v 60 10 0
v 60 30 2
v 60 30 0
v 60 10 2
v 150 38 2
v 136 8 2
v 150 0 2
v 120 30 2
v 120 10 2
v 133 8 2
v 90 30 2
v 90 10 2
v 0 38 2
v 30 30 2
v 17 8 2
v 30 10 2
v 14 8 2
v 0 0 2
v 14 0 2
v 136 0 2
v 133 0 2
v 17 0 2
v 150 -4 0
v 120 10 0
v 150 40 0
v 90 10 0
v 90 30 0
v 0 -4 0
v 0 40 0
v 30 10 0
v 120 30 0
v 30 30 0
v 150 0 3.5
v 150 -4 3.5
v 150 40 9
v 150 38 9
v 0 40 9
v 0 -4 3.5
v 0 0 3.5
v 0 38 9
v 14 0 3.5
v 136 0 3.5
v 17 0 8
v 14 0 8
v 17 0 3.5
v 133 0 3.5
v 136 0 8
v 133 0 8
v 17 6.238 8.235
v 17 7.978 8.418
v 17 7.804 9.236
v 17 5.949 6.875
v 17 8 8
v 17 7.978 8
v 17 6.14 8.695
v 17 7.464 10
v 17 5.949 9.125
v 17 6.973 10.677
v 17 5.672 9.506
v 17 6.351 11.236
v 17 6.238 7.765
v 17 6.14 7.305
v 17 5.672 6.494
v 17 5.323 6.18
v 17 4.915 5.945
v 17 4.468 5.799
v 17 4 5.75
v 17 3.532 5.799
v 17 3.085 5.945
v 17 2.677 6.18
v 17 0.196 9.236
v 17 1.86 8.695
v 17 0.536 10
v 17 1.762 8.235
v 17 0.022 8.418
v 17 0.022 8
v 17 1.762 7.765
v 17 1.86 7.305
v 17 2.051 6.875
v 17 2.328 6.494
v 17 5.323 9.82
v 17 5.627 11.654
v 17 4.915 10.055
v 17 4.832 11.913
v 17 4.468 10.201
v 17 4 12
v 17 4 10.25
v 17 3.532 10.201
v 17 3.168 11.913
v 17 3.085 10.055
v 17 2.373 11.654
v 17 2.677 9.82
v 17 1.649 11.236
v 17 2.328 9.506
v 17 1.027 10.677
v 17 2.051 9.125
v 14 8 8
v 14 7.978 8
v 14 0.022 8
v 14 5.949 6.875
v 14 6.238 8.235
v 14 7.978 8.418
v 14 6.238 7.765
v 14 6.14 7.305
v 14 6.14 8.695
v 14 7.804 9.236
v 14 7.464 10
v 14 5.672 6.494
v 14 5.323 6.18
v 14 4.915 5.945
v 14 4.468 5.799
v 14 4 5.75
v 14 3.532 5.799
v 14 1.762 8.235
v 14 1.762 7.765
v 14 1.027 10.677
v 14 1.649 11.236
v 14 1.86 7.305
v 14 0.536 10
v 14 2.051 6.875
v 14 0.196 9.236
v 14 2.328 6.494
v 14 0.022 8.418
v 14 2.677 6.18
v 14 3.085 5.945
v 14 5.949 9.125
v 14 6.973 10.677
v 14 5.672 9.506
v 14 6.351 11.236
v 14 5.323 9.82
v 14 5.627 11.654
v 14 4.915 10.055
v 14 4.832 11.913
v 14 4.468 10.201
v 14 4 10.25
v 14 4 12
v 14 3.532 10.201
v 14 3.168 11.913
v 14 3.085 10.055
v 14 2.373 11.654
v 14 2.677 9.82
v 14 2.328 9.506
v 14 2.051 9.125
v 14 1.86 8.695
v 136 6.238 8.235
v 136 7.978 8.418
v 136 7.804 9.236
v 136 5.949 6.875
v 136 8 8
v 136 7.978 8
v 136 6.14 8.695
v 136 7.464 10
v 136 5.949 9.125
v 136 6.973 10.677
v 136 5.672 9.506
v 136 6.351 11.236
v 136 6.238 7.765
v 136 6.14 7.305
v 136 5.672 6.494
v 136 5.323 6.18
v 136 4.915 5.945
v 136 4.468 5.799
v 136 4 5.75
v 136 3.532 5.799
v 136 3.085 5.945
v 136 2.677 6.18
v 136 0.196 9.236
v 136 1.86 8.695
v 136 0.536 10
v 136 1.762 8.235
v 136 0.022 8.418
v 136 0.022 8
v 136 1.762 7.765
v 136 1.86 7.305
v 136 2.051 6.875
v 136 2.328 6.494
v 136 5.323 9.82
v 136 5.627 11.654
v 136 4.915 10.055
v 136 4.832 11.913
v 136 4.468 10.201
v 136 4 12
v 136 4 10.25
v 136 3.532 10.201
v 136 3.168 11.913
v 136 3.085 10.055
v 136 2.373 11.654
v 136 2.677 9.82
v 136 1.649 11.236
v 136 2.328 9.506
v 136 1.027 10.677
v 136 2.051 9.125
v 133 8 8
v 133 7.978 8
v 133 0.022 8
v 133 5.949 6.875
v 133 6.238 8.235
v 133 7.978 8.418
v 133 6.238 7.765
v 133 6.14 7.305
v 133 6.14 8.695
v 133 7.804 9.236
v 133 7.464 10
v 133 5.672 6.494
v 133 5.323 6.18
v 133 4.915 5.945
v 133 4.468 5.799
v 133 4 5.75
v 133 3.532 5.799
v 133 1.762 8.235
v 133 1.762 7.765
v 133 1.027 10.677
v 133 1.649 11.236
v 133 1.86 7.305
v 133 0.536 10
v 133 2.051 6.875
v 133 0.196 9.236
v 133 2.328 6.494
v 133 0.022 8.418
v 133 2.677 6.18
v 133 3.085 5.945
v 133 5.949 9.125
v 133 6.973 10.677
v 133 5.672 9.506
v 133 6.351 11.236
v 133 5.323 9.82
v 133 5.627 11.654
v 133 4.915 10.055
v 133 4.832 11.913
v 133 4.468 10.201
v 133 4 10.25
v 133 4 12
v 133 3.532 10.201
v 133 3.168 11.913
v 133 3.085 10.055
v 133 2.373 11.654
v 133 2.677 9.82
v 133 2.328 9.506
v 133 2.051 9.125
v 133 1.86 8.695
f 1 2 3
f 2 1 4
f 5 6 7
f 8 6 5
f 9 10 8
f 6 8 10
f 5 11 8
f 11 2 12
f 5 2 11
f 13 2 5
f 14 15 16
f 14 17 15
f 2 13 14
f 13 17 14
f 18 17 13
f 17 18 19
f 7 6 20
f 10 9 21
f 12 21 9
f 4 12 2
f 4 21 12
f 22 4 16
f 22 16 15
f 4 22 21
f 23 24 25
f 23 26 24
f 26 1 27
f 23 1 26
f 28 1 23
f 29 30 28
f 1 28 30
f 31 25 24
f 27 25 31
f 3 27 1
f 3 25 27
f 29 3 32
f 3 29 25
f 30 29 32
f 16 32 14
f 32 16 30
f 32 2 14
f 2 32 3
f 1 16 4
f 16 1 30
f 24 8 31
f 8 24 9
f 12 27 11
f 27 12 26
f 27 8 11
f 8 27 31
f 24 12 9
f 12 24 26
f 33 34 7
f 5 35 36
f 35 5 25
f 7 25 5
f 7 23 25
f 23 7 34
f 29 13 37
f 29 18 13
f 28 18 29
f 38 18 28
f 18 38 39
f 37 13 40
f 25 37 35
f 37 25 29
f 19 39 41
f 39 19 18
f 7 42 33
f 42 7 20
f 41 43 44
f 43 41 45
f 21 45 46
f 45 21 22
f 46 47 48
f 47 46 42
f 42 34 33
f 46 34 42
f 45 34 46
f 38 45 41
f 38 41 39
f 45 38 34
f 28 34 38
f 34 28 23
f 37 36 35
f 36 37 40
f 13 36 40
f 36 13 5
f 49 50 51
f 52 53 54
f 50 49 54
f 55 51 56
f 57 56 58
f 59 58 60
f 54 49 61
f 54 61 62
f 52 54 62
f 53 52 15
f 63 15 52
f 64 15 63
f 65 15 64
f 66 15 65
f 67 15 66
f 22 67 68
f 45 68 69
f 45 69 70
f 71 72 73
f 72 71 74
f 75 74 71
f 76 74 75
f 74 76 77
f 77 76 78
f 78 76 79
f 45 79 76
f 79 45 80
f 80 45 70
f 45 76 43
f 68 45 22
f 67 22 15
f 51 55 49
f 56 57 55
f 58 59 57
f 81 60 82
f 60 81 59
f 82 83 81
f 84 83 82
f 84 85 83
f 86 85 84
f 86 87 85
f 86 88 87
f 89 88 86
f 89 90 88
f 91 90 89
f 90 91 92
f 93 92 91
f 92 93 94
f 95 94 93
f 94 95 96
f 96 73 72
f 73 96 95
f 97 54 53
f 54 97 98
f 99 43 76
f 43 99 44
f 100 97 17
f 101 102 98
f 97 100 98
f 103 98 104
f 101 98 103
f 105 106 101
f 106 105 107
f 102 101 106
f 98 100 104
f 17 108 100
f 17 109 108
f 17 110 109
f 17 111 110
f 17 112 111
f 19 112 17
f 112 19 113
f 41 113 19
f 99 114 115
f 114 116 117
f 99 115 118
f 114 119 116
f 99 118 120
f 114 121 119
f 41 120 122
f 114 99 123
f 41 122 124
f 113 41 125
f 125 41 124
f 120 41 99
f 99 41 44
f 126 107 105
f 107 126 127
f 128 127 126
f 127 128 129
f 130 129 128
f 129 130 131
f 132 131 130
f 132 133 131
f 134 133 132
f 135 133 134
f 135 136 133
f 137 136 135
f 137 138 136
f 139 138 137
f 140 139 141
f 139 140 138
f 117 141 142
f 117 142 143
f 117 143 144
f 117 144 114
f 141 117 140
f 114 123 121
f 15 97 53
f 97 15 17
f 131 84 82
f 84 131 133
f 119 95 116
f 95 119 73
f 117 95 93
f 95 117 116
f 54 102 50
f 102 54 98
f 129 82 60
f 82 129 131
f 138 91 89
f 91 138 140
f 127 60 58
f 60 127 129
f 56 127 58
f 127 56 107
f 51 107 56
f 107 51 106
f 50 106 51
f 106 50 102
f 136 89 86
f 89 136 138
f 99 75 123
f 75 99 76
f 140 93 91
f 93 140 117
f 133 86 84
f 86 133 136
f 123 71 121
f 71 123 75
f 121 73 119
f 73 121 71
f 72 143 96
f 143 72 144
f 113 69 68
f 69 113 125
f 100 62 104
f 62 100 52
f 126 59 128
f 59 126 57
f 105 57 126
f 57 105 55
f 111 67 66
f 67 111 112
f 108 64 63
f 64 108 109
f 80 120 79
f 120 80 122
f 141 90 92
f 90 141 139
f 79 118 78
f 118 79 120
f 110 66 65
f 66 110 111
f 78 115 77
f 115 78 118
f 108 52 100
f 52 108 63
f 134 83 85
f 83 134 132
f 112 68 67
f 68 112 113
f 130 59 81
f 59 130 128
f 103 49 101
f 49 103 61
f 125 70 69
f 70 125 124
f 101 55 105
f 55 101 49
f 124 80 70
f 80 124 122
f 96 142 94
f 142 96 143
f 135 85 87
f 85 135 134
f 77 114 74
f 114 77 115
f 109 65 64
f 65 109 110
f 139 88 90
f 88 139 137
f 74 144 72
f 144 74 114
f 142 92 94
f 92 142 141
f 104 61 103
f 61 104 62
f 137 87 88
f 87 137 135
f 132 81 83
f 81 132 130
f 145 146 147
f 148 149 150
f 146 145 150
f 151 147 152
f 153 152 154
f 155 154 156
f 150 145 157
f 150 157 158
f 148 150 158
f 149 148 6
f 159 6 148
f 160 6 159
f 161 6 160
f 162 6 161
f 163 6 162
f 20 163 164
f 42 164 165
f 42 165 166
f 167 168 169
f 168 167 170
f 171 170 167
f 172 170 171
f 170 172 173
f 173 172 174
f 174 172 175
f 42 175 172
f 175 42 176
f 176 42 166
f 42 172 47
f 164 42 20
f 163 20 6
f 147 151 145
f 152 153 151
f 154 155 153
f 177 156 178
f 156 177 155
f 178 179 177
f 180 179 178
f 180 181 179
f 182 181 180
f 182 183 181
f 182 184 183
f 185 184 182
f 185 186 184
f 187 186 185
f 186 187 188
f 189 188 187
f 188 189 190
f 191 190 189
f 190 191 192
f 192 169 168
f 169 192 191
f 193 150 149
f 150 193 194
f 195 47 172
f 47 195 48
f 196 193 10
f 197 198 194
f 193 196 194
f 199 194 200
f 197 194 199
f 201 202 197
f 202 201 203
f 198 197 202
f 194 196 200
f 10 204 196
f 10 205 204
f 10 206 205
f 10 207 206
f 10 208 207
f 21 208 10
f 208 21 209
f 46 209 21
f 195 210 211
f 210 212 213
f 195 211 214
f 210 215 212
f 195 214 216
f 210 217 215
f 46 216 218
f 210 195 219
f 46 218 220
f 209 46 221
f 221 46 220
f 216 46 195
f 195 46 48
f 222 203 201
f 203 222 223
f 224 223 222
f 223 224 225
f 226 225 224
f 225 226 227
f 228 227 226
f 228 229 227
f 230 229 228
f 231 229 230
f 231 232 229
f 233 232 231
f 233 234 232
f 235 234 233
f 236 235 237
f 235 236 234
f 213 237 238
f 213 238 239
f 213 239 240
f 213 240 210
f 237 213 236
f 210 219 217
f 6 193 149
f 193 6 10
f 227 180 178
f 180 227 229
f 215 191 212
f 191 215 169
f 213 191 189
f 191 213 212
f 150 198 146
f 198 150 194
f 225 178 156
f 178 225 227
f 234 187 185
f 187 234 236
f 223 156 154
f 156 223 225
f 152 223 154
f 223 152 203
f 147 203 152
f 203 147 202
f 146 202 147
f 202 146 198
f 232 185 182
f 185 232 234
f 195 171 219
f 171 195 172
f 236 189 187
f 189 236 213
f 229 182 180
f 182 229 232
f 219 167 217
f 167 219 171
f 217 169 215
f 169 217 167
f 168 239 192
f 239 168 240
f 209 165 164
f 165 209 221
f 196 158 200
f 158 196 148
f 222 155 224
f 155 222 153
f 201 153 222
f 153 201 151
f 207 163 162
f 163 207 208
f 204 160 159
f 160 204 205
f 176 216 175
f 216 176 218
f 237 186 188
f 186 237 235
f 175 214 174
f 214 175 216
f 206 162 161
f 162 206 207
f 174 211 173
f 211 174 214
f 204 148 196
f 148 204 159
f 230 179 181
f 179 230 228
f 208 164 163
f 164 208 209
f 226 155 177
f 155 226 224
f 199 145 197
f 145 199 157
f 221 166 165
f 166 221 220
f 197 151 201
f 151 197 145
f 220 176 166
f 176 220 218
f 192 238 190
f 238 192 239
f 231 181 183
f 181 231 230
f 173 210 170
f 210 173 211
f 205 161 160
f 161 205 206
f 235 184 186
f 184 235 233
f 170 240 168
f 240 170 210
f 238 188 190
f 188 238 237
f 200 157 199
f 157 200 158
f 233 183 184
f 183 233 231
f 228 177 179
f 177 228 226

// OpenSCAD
// file: joint.scad
module joint(groundSpacing)
{
  hch = groundSpacing + 8/2;  // hole center height

  difference()
  {
    // main element
    union()
    {
      cube([3, 8, hch]);
      translate([0, 8/2, hch])
        rotate([0, 90, 0])
          cylinder(r=8/2, h=3, $fs=0.01);
    }
    // screw hole
    translate([-1, 8/2, hch])
      rotate([0, 90, 0])
        cylinder(r=4.5/2, h=3+2*1, $fs=0.01);
  }
}


joint(1);
// main file
use <joint.scad>

module _supportSurface()
{
  difference()
  {
    // root element
    cube([150, 40, 2]);
    // holes
    for(offset = [30, 90])
      translate([offset, 10, 0])
        cube([30, 20, 2]);
  }
  // lower stripe for wall-support
  off = 4;
  translate([0, -off, 0])
    cube([150, off, 3.5]);
  // upport tablet block-wall
  translate([0, 40-2, 0])
    cube([150, 2, 9]);
}


module support()
{
  _supportSurface();
  for(offset = [10+(3+1), 150-10-3-(3+1)])
    translate([offset, 0, 2])
      joint(2);
}


support();
